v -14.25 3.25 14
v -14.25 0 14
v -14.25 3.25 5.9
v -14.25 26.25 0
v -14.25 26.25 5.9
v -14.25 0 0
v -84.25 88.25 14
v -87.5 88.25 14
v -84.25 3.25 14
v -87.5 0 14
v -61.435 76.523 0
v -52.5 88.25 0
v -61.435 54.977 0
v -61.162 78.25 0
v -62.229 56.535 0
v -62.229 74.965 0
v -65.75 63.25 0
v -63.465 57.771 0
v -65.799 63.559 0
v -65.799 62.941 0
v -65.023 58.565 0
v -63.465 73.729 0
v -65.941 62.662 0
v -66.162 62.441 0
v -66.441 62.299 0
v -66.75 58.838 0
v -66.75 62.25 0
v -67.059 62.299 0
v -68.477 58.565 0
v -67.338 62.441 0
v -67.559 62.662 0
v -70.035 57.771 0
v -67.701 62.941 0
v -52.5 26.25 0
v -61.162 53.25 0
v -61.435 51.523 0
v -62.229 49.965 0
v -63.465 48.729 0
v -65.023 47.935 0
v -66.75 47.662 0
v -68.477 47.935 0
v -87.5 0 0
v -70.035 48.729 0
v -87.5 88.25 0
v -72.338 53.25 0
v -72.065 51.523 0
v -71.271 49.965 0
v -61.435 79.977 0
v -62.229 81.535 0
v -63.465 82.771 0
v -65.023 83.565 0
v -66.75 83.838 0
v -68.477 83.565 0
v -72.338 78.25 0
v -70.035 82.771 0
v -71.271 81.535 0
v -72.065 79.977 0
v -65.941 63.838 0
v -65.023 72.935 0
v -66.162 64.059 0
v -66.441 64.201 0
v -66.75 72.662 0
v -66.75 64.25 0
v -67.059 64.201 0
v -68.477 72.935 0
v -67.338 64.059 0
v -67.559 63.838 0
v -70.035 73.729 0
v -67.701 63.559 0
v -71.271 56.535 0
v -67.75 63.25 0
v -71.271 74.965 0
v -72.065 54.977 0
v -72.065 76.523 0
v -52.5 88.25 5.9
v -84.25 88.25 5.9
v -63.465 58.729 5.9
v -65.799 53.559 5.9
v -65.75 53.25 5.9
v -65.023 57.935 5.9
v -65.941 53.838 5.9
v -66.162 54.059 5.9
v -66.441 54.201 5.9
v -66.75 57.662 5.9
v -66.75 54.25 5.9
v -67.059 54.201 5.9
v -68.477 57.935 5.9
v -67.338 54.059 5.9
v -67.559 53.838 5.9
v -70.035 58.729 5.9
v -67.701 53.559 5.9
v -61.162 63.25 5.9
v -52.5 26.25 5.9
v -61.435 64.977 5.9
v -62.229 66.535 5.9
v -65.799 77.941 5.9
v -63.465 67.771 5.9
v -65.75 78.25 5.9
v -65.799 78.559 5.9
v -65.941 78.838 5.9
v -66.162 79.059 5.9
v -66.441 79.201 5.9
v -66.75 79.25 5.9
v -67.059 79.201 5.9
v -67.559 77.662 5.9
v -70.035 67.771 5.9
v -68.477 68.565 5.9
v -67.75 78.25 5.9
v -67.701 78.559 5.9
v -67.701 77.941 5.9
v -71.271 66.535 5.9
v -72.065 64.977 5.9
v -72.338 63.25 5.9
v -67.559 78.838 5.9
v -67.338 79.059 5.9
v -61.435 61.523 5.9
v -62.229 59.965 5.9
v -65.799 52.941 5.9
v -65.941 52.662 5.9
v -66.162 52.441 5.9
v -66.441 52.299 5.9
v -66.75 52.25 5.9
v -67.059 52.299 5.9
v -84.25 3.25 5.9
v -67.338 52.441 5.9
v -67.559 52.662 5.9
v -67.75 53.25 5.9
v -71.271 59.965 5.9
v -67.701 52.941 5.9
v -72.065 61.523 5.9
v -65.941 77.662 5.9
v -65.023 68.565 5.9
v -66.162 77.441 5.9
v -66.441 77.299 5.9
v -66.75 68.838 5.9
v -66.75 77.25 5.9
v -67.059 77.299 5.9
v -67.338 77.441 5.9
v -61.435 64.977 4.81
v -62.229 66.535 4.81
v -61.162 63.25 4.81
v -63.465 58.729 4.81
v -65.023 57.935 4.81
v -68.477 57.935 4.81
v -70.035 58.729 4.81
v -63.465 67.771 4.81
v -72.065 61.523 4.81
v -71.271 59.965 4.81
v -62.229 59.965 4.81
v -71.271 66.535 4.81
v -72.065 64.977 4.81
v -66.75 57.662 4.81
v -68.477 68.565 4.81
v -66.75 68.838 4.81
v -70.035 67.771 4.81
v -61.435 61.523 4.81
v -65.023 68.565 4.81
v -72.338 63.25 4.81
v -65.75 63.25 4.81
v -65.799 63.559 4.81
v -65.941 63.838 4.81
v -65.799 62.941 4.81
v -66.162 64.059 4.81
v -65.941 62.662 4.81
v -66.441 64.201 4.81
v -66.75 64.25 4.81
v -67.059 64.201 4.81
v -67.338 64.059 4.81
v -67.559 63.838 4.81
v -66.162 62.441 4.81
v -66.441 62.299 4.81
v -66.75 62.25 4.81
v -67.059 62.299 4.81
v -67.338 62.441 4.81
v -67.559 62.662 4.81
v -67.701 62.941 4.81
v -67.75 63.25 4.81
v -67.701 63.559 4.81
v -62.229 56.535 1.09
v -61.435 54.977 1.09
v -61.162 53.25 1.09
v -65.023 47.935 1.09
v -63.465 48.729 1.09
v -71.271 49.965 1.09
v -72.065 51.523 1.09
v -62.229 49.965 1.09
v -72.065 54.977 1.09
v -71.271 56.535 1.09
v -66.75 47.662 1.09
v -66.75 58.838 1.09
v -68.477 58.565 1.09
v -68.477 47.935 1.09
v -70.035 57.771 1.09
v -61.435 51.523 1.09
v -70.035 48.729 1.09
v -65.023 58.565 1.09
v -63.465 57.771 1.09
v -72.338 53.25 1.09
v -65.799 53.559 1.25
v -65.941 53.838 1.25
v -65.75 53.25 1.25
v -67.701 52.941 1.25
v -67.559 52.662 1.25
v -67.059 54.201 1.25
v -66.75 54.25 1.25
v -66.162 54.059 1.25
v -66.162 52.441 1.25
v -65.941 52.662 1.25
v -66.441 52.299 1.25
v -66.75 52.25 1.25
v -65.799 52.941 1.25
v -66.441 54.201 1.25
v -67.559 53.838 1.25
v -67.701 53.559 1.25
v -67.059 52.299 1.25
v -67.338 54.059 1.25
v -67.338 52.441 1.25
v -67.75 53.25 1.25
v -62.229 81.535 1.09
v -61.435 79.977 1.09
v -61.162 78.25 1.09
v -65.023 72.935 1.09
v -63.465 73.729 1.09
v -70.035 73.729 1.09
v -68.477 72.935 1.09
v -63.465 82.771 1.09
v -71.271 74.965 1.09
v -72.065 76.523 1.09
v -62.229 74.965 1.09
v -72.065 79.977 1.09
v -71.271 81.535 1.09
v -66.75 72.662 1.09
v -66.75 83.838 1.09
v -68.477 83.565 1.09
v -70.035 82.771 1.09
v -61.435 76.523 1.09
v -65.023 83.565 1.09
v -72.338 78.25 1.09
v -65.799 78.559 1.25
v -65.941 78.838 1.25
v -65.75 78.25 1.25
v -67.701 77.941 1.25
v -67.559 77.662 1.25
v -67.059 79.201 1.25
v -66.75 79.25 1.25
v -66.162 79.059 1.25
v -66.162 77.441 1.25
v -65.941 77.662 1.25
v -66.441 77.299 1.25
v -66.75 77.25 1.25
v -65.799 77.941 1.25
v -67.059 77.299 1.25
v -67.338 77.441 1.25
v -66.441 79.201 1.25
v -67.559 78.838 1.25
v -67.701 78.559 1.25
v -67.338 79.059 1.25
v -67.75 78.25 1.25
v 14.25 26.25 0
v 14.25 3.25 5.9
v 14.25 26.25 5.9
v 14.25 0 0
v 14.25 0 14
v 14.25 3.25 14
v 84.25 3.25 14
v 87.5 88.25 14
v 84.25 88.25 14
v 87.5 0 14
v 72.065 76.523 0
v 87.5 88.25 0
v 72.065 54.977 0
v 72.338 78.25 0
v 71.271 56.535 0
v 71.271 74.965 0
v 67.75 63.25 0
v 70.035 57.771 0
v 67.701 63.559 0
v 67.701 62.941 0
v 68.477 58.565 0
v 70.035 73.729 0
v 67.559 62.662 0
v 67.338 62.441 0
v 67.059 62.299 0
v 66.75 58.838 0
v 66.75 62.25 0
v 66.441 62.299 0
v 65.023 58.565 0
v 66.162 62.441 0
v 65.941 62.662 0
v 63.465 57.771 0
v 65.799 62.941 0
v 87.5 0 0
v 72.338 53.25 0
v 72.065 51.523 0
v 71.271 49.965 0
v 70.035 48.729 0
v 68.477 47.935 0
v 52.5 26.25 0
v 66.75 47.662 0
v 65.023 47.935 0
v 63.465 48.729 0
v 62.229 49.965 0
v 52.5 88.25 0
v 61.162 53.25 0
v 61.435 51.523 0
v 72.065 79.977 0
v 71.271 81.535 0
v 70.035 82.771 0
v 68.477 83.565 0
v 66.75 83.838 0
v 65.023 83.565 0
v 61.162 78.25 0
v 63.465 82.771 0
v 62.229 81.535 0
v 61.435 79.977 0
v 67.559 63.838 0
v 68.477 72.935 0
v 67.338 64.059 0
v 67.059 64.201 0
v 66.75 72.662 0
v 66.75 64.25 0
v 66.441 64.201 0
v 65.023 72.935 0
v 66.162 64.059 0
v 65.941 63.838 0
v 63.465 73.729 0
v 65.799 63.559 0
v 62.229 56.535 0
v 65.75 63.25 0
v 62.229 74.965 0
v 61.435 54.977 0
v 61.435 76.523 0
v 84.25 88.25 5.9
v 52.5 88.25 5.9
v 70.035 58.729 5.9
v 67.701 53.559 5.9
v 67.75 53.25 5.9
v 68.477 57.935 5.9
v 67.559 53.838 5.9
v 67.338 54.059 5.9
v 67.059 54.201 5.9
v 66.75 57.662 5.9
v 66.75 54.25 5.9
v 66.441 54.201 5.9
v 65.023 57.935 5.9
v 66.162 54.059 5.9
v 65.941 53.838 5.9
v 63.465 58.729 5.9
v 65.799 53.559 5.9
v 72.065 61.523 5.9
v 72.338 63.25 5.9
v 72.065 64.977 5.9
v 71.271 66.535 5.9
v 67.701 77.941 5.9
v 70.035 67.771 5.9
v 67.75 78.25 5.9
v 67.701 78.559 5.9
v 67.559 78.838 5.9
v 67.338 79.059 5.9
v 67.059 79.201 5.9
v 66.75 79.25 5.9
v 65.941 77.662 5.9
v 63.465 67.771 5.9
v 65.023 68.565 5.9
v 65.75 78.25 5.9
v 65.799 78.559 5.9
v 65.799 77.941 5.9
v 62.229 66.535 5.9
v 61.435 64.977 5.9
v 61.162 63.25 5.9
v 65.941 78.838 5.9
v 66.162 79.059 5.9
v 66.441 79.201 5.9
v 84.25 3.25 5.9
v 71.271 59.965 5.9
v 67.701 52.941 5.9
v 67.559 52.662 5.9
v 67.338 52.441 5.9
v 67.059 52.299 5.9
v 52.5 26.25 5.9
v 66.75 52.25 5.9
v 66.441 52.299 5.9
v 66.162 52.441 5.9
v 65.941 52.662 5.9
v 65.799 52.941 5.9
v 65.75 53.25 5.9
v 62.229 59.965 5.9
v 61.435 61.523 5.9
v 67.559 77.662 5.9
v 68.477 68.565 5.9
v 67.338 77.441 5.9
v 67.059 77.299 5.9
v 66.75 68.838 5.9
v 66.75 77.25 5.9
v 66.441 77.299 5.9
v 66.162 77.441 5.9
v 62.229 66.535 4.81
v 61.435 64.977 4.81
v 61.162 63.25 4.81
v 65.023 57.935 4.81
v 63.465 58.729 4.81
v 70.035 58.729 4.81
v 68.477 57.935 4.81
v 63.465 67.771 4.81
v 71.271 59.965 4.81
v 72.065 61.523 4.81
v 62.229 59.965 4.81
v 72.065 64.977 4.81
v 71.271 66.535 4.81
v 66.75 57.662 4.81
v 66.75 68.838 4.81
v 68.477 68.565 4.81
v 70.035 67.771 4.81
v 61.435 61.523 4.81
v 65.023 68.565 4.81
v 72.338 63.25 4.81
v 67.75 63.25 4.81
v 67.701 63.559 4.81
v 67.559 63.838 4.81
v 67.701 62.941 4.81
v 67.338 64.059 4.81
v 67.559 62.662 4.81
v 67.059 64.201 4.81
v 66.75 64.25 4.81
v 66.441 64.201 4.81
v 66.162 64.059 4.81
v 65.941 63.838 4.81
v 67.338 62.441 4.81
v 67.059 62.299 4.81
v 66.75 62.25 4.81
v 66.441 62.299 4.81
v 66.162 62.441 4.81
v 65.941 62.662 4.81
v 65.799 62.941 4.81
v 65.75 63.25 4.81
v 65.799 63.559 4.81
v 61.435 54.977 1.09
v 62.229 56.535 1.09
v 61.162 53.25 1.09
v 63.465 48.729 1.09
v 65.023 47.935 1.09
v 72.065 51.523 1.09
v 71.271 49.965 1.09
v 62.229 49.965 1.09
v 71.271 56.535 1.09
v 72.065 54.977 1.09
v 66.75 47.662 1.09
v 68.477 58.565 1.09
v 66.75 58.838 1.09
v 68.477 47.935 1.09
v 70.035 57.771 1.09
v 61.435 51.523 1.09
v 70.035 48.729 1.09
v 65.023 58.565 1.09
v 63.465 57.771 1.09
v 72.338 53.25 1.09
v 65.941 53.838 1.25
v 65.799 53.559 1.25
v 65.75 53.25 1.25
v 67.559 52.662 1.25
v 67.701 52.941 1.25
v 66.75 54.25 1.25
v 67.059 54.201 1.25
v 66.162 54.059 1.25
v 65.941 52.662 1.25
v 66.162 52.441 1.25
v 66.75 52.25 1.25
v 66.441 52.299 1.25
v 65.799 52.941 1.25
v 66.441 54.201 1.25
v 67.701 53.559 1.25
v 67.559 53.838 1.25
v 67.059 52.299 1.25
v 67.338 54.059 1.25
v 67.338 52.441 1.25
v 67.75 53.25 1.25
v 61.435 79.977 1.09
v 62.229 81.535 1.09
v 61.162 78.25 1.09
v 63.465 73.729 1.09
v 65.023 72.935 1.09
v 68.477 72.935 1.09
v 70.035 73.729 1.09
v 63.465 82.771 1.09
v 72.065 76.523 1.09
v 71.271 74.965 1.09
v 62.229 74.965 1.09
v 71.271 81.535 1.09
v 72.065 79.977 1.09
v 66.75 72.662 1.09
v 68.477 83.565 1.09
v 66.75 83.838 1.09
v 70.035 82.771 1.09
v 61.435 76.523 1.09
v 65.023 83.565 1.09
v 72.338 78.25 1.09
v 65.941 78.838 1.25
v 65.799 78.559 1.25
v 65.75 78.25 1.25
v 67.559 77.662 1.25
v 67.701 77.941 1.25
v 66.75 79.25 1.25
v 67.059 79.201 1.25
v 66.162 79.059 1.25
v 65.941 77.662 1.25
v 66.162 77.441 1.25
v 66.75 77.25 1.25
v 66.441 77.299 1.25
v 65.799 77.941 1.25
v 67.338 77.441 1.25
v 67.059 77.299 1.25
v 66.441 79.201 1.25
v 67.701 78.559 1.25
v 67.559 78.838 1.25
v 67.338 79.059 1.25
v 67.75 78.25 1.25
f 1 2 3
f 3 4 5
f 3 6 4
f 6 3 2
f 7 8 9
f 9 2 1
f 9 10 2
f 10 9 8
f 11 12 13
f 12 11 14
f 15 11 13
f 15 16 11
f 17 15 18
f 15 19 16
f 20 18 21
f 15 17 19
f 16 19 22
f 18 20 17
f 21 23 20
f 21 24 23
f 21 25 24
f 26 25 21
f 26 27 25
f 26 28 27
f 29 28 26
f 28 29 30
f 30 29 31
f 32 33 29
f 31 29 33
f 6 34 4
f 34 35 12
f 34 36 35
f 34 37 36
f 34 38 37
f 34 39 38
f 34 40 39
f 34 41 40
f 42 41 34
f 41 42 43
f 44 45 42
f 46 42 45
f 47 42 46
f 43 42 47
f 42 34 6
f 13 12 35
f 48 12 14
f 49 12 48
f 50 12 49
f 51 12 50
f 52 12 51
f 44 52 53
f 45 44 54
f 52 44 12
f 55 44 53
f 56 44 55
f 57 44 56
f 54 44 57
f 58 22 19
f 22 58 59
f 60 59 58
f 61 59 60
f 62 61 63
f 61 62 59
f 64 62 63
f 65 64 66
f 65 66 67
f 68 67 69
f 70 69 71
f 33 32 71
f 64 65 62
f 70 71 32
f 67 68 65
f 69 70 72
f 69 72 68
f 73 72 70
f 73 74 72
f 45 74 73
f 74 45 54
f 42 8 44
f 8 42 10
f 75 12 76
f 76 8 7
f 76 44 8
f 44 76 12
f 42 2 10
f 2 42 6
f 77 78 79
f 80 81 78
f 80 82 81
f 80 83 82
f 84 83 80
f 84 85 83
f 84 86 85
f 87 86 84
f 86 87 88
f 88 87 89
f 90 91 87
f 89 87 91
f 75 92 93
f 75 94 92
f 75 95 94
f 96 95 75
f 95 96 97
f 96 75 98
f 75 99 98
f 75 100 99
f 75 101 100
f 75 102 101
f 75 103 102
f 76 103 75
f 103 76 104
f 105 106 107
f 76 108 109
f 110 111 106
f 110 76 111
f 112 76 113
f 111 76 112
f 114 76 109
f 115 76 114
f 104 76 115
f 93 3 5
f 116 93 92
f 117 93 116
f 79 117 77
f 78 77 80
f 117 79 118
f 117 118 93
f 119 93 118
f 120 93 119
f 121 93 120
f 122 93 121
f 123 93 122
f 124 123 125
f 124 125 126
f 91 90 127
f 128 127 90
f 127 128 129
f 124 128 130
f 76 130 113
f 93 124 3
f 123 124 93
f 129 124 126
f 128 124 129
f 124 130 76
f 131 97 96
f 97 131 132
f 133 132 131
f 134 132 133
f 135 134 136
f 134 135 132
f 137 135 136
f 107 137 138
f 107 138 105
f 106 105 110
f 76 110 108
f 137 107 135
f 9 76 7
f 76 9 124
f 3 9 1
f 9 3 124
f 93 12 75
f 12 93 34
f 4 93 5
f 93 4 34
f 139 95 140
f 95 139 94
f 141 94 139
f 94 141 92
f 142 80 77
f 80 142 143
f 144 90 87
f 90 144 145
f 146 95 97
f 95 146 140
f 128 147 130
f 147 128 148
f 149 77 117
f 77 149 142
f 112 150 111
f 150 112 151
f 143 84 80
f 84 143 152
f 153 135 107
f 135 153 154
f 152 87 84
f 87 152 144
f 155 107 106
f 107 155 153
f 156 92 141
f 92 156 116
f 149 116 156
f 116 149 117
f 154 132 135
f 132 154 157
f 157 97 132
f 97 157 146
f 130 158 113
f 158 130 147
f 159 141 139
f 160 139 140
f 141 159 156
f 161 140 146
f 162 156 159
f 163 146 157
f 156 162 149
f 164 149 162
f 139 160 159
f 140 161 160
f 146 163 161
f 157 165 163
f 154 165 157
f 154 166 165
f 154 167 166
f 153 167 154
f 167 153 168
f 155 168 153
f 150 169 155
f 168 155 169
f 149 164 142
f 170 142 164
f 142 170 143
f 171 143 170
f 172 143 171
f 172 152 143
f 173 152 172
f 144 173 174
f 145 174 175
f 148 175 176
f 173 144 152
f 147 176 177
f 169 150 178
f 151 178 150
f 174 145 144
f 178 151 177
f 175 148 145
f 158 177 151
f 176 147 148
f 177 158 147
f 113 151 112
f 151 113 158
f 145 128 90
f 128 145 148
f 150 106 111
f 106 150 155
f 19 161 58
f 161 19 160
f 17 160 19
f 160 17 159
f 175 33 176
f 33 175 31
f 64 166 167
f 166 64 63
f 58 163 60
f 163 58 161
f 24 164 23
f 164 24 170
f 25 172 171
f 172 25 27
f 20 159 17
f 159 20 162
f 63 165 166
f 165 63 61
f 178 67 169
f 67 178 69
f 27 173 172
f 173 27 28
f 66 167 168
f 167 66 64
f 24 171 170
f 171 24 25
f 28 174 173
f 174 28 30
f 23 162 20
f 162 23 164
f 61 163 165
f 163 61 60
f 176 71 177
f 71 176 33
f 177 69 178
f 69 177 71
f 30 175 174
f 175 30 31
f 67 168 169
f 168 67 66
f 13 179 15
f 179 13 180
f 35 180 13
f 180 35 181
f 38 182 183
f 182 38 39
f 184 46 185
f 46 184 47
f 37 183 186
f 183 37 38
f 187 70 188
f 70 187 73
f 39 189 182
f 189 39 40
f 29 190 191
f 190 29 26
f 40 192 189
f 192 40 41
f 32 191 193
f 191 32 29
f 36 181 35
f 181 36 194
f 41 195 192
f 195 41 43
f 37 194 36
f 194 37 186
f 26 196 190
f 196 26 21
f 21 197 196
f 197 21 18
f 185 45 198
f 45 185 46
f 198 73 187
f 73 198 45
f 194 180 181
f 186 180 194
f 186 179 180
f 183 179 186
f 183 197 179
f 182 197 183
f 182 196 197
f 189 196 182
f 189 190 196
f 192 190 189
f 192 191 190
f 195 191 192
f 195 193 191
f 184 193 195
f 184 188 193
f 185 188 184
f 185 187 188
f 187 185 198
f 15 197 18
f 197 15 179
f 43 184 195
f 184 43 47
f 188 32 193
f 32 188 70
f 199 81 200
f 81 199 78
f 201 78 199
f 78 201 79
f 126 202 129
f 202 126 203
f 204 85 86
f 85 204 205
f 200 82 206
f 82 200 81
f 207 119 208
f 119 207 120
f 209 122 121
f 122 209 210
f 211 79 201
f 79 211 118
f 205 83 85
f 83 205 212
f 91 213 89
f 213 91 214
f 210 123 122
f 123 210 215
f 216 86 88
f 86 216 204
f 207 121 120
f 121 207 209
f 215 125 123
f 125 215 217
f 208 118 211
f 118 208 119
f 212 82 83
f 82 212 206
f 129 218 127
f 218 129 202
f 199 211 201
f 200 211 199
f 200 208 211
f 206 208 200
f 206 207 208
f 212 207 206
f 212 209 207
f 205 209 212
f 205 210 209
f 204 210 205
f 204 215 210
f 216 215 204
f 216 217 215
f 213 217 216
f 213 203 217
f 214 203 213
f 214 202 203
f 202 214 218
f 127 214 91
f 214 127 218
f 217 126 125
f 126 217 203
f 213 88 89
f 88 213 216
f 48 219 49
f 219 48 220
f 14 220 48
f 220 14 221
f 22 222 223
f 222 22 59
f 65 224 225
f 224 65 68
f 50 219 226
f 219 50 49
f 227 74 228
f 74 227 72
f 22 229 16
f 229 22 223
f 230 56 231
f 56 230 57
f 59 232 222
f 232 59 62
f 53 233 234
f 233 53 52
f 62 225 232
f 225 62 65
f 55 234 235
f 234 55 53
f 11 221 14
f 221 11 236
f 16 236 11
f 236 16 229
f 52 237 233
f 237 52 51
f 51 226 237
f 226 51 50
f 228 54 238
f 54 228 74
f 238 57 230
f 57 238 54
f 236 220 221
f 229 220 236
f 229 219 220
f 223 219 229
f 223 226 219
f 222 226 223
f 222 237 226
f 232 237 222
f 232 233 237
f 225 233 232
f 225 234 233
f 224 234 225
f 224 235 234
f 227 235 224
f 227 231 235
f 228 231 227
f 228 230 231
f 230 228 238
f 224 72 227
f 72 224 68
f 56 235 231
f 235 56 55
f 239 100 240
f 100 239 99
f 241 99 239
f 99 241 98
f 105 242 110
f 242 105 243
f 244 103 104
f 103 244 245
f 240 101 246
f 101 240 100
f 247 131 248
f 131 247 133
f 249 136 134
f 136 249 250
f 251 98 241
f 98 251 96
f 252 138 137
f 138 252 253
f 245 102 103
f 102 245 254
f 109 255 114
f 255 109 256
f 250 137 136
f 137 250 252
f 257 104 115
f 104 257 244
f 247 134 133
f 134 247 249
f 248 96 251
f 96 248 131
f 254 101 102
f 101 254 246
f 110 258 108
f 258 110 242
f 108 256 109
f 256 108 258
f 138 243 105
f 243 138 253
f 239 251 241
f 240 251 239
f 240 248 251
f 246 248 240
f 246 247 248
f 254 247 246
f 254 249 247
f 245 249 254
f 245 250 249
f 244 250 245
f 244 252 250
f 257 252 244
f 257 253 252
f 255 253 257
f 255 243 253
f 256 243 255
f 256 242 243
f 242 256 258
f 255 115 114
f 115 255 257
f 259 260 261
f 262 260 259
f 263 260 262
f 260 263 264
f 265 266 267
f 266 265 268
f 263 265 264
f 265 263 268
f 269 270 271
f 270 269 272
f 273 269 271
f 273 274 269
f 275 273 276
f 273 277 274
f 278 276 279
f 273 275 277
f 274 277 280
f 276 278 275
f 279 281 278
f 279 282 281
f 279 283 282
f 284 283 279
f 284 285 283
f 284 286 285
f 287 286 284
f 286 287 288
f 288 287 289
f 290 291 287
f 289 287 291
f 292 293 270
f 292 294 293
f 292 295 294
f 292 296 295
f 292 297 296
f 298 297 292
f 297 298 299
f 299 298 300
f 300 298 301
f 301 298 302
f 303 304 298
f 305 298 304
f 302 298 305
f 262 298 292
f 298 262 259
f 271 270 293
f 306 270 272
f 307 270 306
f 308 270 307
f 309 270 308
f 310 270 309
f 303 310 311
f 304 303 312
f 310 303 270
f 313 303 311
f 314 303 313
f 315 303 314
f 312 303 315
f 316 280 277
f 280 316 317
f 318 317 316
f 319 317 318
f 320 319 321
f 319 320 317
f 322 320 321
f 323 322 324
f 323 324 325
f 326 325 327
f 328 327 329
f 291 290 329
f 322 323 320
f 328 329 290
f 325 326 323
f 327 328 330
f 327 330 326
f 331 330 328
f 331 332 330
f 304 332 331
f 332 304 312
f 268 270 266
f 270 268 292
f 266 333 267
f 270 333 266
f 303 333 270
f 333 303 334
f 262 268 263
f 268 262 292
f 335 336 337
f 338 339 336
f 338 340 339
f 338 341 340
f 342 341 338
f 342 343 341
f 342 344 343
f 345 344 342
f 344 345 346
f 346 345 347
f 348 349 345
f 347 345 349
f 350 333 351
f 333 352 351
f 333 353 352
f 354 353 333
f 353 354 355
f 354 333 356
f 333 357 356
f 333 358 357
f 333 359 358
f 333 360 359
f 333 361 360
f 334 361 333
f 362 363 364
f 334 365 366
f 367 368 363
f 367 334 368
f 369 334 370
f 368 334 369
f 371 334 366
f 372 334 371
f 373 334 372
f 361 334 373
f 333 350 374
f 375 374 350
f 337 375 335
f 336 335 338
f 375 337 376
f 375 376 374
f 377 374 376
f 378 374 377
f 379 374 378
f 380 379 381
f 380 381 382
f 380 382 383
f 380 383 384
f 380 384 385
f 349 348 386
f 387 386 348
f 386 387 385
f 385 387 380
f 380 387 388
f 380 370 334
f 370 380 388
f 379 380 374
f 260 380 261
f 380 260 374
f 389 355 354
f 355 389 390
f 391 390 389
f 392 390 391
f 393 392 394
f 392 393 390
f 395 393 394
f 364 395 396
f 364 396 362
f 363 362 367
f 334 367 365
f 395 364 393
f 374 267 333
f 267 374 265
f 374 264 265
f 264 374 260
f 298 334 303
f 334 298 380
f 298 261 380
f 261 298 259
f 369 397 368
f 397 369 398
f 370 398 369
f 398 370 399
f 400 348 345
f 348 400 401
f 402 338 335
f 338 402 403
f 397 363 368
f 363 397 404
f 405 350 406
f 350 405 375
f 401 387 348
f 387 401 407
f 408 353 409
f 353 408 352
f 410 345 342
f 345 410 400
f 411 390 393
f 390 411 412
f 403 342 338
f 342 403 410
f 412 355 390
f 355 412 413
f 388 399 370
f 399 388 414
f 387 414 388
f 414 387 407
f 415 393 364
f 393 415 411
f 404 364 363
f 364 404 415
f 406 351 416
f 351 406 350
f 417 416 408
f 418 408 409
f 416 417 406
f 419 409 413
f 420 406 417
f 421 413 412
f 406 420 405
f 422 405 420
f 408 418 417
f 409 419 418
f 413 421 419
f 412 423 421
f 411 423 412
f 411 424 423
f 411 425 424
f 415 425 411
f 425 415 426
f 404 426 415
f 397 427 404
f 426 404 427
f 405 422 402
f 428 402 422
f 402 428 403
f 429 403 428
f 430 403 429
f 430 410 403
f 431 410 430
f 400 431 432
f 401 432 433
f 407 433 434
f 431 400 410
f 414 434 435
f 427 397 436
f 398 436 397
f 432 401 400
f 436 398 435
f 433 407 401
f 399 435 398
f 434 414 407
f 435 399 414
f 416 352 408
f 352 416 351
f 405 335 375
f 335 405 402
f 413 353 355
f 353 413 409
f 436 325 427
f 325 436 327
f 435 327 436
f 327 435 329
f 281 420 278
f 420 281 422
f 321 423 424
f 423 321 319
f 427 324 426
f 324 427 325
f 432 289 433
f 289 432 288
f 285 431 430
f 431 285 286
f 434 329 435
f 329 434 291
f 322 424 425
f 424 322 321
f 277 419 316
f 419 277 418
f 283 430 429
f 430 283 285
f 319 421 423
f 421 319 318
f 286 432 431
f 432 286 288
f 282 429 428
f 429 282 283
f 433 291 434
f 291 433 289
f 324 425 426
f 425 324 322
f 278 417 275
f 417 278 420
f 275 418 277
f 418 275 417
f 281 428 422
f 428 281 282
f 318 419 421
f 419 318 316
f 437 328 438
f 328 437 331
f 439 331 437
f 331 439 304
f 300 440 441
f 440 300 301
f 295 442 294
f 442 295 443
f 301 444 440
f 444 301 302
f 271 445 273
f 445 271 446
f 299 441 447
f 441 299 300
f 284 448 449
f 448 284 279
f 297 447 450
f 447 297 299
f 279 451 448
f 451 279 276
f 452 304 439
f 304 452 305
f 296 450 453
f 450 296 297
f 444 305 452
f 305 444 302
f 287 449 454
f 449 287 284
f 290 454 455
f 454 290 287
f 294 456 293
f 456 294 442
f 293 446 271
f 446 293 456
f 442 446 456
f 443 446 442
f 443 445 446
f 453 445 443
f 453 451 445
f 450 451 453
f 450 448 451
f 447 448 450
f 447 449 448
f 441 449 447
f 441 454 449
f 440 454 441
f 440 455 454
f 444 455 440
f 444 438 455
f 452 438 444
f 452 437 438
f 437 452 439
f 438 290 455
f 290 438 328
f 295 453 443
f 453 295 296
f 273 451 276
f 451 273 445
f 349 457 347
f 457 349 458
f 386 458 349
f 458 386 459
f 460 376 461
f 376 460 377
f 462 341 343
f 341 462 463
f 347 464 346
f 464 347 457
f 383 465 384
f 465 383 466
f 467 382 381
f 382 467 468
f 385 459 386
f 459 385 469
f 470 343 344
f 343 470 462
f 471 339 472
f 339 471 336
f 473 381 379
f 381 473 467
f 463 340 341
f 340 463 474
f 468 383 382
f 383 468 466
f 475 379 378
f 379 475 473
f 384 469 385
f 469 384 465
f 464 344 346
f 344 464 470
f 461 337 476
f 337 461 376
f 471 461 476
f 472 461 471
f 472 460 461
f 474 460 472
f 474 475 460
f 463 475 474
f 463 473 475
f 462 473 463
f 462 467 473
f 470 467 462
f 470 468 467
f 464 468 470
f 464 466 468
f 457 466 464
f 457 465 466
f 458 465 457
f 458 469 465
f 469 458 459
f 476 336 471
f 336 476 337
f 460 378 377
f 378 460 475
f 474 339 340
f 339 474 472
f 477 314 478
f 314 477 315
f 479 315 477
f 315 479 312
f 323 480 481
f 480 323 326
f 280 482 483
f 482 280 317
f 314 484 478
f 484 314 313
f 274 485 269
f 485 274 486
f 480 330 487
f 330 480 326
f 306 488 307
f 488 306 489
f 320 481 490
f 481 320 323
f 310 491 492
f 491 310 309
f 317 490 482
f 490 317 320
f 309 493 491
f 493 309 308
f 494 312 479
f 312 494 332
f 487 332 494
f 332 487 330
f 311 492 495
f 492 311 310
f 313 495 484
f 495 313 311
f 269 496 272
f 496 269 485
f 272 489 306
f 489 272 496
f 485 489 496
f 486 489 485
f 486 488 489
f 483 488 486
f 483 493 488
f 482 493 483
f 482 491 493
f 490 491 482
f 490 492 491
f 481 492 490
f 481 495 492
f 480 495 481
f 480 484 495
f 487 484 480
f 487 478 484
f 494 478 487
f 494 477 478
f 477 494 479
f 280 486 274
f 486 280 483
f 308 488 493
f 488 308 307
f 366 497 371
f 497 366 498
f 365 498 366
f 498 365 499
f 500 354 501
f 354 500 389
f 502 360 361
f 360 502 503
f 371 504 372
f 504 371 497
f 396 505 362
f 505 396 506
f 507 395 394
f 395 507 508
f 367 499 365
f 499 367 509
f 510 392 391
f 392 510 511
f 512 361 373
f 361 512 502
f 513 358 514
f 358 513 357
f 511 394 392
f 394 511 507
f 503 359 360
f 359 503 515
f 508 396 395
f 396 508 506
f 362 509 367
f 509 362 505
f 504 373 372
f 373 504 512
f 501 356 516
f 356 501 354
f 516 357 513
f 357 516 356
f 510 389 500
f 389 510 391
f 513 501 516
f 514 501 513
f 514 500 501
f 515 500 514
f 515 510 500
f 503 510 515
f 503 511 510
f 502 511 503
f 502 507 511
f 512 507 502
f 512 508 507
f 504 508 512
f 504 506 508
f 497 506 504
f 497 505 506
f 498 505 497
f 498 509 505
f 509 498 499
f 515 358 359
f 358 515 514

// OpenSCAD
/* [Frame and Mounting Bracket Dimensions] */

//Not the width of the picture, but the with of the frame slats. (In millimeters)
frame_width = 35; // max: [100]

//Distance from the top edge of the frame to where you want the hanger nails to be. (In millimeters)
hanger_to_top = 60; // max: [1000]

//Distance from the hanger nail to the upper hole of the mounting bracket. (Measured center to center in millimeters) If the nail hole has a slot, measure from the upper end of the slot, where the center of the nail would ultimatly be.
nail_to_upper = 10; // max: [100]

//Distance between the upper and lower mounting bracket holes. (Measured center to center in millimeters)
mount_size = 25; //max: [200]


/* [Printing Options] */

//Layer height that you will be printing at.  Entering this info will make the support membrane match so that it prints correctly.
layer = 0.15; //[.1, .15, .2, .3]

//turning this on will cut away some of the excess material.  Good your dimensions are large. If your jig is small, leave this off.
filament_saver = false; //[true,false]


/* [Thumb Tack Dimensions] */

//tack head diameter (the default is 7/16 inch)
tack_head_d = 11.176; //max: [25]


/* [Hidden] */
	rim_height = 14;  //height of rim around the edge
    rim_thickness = 3.25; //width of rim around the edge
    tack_head_h = 1.09; //tack head height
	tack_tip_d = 2; // tack tip diameter (with clearance)
    base_thickness = 5.9; //thickness of the base (where the tacks go)
    
    upper_mount = hanger_to_top - nail_to_upper;
    lower_mount = upper_mount + mount_size;


mirror_copy([1,0,0])
Wall_Frame_Jig(frame_width,hanger_to_top,nail_to_upper,mount_size,layer,filament_saver,tack_head_d);


//custom mirror module that retains the original
    module mirror_copy(v=[0,1,0]){
        children();
        mirror(v) children();
    }

module Wall_Frame_Jig(frame_width,hanger_to_top,nail_to_upper,mount_size,layer,filament_saver,tack_head_d)
{
	

    
    //lower_mount = distance from dop of frame to the lower of the mount bracket mounts
    
    	
    
	
  translate([-2.5*frame_width,0,0]) 
    //the jig
	difference() {
        //outer edges
		cube([(2*frame_width)+rim_thickness,rim_thickness+lower_mount+10,rim_height],false);
		
        //frame socket
        translate([rim_thickness,rim_thickness,base_thickness]) 	
			cube([(2*frame_width)+rim_thickness,(2*frame_width)+lower_mount+10,rim_height],false);
        
        //cut out the interior of the L
        translate([frame_width,frame_width*0.75,-1]) 	
			cube([2*frame_width,(2*frame_width)+lower_mount+10,rim_height+1],false);
        
        //head of tack for wall nail location
        translate([rim_thickness+frame_width/2,rim_thickness+hanger_to_top,base_thickness-tack_head_h]) 
            cylinder(  h=tack_head_h, d=tack_head_d, $fn=20, center=false);
        
        //clearance hole for tip
        translate([rim_thickness+frame_width/2,rim_thickness+hanger_to_top,0]) 
            cylinder(  h=rim_height, d=tack_tip_d, $fn=20, center=false);
        
         //head of tack for upper bracket mount
        translate([rim_thickness+frame_width/2,rim_thickness+upper_mount,0]) 
            cylinder(  h=tack_head_h, d=tack_head_d, $fn=20, center=false);
            
            //clearance hole for tip of upper bracket
        translate([rim_thickness+frame_width/2,rim_thickness+upper_mount,tack_head_h+layer+.01]) 
             cylinder(  h=rim_height, d=tack_tip_d, $fn=20, center=false);
        
               //head of tack for lower bracket mount
        translate([rim_thickness+frame_width/2,rim_thickness+lower_mount,0]) 
            cylinder(  h=tack_head_h, d=tack_head_d, $fn=20, center=false);
            
            //clearance hole for tip of lower bracket
        translate([rim_thickness+frame_width/2,rim_thickness+lower_mount,tack_head_h+layer+.01]) 
             cylinder(  h=rim_height, d=tack_tip_d, $fn=20, center=false);
    }

}
